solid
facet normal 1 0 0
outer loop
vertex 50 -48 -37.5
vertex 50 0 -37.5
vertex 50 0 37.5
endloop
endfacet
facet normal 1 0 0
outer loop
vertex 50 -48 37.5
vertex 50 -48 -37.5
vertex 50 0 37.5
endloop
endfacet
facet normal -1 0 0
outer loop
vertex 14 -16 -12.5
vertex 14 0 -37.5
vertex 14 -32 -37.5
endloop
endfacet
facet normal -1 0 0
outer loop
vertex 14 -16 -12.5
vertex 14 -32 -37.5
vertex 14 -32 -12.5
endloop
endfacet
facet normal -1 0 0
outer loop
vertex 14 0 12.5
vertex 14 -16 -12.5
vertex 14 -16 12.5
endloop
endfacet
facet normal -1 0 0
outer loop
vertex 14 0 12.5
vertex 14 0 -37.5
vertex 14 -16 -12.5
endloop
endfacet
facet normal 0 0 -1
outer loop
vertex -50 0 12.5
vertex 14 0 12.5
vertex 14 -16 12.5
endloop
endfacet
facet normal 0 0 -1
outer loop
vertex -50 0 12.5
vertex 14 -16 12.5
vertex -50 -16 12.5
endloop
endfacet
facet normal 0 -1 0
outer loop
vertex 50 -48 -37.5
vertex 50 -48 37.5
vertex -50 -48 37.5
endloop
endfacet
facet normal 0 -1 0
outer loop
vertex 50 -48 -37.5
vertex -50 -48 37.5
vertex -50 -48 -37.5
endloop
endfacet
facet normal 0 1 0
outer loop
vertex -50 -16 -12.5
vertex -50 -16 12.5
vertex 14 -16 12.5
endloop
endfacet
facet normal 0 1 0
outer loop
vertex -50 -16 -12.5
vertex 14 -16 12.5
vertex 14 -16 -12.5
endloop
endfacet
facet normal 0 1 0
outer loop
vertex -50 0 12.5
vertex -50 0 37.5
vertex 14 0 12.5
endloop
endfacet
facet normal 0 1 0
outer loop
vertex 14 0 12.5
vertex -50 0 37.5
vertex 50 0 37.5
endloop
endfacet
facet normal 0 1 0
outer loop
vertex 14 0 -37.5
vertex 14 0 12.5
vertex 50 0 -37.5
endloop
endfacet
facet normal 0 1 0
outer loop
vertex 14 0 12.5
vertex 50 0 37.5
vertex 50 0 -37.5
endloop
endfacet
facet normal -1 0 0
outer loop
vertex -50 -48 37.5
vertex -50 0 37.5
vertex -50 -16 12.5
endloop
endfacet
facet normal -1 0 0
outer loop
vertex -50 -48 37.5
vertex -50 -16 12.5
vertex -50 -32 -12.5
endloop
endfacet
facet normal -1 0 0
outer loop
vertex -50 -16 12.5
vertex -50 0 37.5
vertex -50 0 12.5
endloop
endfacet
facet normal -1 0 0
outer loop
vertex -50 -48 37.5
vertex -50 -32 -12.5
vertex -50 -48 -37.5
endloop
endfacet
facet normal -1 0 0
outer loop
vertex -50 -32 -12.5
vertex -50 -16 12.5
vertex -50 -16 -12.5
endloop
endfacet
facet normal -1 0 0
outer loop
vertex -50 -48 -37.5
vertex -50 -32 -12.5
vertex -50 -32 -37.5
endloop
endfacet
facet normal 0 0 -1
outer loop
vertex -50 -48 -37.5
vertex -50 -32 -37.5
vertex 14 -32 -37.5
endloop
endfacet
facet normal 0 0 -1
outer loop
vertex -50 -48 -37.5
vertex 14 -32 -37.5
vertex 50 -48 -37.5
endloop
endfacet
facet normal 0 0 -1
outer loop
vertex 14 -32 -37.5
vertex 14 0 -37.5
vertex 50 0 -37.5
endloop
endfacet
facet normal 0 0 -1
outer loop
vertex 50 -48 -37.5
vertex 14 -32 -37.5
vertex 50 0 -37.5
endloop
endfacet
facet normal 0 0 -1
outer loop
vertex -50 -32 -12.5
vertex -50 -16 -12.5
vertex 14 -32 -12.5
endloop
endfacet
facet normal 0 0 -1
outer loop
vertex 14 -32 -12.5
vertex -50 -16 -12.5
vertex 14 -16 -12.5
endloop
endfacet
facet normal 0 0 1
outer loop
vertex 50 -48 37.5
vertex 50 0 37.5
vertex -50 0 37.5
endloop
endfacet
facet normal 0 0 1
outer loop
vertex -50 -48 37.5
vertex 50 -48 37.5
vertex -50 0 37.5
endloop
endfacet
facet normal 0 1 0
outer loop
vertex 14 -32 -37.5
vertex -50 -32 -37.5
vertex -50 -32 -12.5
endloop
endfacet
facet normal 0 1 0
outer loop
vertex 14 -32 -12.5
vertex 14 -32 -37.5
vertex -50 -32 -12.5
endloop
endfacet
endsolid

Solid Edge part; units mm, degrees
sketch "Sketch1" plane through (0, 0, 0) normal (0, -1, 0) x (1, 0, 0)
  line L0 (50, 37.5) -> (-50, 37.5)
  line L1 (-50, 37.5) -> (-50, -37.5)
  line L2 (-50, -37.5) -> (50, -37.5)
  line L3 (50, -37.5) -> (50, 37.5)
extrude "Protrusion1" add sketch "Sketch1" along normal blind 48
sketch "Sketch2" plane through (0, 0, 0) normal (0, -1, 0) x (1, 0, 0)
  line L0 (14, 12.5) -> (-50, 12.5)
  line L1 (-50, 12.5) -> (-50, -12.5)
  line L2 (-50, -12.5) -> (14, -12.5)
  line L3 (14, -12.5) -> (14, 12.5)
extrude "ExtrudedCutout_2" cut sketch "Sketch2" along normal blind 16
sketch "Sketch3" plane through (0, 0, 0) normal (0, -1, 0) x (1, 0, 0)
  line L0 (-50, -12.5) -> (14, -12.5)
  line L1 (14, -37.5) -> (14, -12.5)
  line L2 (-50, -37.5) -> (14, -37.5)
  line L3 (-50, -12.5) -> (-50, -37.5)
extrude "ExtrudedCutout_3" cut sketch "Sketch3" along normal blind 32
